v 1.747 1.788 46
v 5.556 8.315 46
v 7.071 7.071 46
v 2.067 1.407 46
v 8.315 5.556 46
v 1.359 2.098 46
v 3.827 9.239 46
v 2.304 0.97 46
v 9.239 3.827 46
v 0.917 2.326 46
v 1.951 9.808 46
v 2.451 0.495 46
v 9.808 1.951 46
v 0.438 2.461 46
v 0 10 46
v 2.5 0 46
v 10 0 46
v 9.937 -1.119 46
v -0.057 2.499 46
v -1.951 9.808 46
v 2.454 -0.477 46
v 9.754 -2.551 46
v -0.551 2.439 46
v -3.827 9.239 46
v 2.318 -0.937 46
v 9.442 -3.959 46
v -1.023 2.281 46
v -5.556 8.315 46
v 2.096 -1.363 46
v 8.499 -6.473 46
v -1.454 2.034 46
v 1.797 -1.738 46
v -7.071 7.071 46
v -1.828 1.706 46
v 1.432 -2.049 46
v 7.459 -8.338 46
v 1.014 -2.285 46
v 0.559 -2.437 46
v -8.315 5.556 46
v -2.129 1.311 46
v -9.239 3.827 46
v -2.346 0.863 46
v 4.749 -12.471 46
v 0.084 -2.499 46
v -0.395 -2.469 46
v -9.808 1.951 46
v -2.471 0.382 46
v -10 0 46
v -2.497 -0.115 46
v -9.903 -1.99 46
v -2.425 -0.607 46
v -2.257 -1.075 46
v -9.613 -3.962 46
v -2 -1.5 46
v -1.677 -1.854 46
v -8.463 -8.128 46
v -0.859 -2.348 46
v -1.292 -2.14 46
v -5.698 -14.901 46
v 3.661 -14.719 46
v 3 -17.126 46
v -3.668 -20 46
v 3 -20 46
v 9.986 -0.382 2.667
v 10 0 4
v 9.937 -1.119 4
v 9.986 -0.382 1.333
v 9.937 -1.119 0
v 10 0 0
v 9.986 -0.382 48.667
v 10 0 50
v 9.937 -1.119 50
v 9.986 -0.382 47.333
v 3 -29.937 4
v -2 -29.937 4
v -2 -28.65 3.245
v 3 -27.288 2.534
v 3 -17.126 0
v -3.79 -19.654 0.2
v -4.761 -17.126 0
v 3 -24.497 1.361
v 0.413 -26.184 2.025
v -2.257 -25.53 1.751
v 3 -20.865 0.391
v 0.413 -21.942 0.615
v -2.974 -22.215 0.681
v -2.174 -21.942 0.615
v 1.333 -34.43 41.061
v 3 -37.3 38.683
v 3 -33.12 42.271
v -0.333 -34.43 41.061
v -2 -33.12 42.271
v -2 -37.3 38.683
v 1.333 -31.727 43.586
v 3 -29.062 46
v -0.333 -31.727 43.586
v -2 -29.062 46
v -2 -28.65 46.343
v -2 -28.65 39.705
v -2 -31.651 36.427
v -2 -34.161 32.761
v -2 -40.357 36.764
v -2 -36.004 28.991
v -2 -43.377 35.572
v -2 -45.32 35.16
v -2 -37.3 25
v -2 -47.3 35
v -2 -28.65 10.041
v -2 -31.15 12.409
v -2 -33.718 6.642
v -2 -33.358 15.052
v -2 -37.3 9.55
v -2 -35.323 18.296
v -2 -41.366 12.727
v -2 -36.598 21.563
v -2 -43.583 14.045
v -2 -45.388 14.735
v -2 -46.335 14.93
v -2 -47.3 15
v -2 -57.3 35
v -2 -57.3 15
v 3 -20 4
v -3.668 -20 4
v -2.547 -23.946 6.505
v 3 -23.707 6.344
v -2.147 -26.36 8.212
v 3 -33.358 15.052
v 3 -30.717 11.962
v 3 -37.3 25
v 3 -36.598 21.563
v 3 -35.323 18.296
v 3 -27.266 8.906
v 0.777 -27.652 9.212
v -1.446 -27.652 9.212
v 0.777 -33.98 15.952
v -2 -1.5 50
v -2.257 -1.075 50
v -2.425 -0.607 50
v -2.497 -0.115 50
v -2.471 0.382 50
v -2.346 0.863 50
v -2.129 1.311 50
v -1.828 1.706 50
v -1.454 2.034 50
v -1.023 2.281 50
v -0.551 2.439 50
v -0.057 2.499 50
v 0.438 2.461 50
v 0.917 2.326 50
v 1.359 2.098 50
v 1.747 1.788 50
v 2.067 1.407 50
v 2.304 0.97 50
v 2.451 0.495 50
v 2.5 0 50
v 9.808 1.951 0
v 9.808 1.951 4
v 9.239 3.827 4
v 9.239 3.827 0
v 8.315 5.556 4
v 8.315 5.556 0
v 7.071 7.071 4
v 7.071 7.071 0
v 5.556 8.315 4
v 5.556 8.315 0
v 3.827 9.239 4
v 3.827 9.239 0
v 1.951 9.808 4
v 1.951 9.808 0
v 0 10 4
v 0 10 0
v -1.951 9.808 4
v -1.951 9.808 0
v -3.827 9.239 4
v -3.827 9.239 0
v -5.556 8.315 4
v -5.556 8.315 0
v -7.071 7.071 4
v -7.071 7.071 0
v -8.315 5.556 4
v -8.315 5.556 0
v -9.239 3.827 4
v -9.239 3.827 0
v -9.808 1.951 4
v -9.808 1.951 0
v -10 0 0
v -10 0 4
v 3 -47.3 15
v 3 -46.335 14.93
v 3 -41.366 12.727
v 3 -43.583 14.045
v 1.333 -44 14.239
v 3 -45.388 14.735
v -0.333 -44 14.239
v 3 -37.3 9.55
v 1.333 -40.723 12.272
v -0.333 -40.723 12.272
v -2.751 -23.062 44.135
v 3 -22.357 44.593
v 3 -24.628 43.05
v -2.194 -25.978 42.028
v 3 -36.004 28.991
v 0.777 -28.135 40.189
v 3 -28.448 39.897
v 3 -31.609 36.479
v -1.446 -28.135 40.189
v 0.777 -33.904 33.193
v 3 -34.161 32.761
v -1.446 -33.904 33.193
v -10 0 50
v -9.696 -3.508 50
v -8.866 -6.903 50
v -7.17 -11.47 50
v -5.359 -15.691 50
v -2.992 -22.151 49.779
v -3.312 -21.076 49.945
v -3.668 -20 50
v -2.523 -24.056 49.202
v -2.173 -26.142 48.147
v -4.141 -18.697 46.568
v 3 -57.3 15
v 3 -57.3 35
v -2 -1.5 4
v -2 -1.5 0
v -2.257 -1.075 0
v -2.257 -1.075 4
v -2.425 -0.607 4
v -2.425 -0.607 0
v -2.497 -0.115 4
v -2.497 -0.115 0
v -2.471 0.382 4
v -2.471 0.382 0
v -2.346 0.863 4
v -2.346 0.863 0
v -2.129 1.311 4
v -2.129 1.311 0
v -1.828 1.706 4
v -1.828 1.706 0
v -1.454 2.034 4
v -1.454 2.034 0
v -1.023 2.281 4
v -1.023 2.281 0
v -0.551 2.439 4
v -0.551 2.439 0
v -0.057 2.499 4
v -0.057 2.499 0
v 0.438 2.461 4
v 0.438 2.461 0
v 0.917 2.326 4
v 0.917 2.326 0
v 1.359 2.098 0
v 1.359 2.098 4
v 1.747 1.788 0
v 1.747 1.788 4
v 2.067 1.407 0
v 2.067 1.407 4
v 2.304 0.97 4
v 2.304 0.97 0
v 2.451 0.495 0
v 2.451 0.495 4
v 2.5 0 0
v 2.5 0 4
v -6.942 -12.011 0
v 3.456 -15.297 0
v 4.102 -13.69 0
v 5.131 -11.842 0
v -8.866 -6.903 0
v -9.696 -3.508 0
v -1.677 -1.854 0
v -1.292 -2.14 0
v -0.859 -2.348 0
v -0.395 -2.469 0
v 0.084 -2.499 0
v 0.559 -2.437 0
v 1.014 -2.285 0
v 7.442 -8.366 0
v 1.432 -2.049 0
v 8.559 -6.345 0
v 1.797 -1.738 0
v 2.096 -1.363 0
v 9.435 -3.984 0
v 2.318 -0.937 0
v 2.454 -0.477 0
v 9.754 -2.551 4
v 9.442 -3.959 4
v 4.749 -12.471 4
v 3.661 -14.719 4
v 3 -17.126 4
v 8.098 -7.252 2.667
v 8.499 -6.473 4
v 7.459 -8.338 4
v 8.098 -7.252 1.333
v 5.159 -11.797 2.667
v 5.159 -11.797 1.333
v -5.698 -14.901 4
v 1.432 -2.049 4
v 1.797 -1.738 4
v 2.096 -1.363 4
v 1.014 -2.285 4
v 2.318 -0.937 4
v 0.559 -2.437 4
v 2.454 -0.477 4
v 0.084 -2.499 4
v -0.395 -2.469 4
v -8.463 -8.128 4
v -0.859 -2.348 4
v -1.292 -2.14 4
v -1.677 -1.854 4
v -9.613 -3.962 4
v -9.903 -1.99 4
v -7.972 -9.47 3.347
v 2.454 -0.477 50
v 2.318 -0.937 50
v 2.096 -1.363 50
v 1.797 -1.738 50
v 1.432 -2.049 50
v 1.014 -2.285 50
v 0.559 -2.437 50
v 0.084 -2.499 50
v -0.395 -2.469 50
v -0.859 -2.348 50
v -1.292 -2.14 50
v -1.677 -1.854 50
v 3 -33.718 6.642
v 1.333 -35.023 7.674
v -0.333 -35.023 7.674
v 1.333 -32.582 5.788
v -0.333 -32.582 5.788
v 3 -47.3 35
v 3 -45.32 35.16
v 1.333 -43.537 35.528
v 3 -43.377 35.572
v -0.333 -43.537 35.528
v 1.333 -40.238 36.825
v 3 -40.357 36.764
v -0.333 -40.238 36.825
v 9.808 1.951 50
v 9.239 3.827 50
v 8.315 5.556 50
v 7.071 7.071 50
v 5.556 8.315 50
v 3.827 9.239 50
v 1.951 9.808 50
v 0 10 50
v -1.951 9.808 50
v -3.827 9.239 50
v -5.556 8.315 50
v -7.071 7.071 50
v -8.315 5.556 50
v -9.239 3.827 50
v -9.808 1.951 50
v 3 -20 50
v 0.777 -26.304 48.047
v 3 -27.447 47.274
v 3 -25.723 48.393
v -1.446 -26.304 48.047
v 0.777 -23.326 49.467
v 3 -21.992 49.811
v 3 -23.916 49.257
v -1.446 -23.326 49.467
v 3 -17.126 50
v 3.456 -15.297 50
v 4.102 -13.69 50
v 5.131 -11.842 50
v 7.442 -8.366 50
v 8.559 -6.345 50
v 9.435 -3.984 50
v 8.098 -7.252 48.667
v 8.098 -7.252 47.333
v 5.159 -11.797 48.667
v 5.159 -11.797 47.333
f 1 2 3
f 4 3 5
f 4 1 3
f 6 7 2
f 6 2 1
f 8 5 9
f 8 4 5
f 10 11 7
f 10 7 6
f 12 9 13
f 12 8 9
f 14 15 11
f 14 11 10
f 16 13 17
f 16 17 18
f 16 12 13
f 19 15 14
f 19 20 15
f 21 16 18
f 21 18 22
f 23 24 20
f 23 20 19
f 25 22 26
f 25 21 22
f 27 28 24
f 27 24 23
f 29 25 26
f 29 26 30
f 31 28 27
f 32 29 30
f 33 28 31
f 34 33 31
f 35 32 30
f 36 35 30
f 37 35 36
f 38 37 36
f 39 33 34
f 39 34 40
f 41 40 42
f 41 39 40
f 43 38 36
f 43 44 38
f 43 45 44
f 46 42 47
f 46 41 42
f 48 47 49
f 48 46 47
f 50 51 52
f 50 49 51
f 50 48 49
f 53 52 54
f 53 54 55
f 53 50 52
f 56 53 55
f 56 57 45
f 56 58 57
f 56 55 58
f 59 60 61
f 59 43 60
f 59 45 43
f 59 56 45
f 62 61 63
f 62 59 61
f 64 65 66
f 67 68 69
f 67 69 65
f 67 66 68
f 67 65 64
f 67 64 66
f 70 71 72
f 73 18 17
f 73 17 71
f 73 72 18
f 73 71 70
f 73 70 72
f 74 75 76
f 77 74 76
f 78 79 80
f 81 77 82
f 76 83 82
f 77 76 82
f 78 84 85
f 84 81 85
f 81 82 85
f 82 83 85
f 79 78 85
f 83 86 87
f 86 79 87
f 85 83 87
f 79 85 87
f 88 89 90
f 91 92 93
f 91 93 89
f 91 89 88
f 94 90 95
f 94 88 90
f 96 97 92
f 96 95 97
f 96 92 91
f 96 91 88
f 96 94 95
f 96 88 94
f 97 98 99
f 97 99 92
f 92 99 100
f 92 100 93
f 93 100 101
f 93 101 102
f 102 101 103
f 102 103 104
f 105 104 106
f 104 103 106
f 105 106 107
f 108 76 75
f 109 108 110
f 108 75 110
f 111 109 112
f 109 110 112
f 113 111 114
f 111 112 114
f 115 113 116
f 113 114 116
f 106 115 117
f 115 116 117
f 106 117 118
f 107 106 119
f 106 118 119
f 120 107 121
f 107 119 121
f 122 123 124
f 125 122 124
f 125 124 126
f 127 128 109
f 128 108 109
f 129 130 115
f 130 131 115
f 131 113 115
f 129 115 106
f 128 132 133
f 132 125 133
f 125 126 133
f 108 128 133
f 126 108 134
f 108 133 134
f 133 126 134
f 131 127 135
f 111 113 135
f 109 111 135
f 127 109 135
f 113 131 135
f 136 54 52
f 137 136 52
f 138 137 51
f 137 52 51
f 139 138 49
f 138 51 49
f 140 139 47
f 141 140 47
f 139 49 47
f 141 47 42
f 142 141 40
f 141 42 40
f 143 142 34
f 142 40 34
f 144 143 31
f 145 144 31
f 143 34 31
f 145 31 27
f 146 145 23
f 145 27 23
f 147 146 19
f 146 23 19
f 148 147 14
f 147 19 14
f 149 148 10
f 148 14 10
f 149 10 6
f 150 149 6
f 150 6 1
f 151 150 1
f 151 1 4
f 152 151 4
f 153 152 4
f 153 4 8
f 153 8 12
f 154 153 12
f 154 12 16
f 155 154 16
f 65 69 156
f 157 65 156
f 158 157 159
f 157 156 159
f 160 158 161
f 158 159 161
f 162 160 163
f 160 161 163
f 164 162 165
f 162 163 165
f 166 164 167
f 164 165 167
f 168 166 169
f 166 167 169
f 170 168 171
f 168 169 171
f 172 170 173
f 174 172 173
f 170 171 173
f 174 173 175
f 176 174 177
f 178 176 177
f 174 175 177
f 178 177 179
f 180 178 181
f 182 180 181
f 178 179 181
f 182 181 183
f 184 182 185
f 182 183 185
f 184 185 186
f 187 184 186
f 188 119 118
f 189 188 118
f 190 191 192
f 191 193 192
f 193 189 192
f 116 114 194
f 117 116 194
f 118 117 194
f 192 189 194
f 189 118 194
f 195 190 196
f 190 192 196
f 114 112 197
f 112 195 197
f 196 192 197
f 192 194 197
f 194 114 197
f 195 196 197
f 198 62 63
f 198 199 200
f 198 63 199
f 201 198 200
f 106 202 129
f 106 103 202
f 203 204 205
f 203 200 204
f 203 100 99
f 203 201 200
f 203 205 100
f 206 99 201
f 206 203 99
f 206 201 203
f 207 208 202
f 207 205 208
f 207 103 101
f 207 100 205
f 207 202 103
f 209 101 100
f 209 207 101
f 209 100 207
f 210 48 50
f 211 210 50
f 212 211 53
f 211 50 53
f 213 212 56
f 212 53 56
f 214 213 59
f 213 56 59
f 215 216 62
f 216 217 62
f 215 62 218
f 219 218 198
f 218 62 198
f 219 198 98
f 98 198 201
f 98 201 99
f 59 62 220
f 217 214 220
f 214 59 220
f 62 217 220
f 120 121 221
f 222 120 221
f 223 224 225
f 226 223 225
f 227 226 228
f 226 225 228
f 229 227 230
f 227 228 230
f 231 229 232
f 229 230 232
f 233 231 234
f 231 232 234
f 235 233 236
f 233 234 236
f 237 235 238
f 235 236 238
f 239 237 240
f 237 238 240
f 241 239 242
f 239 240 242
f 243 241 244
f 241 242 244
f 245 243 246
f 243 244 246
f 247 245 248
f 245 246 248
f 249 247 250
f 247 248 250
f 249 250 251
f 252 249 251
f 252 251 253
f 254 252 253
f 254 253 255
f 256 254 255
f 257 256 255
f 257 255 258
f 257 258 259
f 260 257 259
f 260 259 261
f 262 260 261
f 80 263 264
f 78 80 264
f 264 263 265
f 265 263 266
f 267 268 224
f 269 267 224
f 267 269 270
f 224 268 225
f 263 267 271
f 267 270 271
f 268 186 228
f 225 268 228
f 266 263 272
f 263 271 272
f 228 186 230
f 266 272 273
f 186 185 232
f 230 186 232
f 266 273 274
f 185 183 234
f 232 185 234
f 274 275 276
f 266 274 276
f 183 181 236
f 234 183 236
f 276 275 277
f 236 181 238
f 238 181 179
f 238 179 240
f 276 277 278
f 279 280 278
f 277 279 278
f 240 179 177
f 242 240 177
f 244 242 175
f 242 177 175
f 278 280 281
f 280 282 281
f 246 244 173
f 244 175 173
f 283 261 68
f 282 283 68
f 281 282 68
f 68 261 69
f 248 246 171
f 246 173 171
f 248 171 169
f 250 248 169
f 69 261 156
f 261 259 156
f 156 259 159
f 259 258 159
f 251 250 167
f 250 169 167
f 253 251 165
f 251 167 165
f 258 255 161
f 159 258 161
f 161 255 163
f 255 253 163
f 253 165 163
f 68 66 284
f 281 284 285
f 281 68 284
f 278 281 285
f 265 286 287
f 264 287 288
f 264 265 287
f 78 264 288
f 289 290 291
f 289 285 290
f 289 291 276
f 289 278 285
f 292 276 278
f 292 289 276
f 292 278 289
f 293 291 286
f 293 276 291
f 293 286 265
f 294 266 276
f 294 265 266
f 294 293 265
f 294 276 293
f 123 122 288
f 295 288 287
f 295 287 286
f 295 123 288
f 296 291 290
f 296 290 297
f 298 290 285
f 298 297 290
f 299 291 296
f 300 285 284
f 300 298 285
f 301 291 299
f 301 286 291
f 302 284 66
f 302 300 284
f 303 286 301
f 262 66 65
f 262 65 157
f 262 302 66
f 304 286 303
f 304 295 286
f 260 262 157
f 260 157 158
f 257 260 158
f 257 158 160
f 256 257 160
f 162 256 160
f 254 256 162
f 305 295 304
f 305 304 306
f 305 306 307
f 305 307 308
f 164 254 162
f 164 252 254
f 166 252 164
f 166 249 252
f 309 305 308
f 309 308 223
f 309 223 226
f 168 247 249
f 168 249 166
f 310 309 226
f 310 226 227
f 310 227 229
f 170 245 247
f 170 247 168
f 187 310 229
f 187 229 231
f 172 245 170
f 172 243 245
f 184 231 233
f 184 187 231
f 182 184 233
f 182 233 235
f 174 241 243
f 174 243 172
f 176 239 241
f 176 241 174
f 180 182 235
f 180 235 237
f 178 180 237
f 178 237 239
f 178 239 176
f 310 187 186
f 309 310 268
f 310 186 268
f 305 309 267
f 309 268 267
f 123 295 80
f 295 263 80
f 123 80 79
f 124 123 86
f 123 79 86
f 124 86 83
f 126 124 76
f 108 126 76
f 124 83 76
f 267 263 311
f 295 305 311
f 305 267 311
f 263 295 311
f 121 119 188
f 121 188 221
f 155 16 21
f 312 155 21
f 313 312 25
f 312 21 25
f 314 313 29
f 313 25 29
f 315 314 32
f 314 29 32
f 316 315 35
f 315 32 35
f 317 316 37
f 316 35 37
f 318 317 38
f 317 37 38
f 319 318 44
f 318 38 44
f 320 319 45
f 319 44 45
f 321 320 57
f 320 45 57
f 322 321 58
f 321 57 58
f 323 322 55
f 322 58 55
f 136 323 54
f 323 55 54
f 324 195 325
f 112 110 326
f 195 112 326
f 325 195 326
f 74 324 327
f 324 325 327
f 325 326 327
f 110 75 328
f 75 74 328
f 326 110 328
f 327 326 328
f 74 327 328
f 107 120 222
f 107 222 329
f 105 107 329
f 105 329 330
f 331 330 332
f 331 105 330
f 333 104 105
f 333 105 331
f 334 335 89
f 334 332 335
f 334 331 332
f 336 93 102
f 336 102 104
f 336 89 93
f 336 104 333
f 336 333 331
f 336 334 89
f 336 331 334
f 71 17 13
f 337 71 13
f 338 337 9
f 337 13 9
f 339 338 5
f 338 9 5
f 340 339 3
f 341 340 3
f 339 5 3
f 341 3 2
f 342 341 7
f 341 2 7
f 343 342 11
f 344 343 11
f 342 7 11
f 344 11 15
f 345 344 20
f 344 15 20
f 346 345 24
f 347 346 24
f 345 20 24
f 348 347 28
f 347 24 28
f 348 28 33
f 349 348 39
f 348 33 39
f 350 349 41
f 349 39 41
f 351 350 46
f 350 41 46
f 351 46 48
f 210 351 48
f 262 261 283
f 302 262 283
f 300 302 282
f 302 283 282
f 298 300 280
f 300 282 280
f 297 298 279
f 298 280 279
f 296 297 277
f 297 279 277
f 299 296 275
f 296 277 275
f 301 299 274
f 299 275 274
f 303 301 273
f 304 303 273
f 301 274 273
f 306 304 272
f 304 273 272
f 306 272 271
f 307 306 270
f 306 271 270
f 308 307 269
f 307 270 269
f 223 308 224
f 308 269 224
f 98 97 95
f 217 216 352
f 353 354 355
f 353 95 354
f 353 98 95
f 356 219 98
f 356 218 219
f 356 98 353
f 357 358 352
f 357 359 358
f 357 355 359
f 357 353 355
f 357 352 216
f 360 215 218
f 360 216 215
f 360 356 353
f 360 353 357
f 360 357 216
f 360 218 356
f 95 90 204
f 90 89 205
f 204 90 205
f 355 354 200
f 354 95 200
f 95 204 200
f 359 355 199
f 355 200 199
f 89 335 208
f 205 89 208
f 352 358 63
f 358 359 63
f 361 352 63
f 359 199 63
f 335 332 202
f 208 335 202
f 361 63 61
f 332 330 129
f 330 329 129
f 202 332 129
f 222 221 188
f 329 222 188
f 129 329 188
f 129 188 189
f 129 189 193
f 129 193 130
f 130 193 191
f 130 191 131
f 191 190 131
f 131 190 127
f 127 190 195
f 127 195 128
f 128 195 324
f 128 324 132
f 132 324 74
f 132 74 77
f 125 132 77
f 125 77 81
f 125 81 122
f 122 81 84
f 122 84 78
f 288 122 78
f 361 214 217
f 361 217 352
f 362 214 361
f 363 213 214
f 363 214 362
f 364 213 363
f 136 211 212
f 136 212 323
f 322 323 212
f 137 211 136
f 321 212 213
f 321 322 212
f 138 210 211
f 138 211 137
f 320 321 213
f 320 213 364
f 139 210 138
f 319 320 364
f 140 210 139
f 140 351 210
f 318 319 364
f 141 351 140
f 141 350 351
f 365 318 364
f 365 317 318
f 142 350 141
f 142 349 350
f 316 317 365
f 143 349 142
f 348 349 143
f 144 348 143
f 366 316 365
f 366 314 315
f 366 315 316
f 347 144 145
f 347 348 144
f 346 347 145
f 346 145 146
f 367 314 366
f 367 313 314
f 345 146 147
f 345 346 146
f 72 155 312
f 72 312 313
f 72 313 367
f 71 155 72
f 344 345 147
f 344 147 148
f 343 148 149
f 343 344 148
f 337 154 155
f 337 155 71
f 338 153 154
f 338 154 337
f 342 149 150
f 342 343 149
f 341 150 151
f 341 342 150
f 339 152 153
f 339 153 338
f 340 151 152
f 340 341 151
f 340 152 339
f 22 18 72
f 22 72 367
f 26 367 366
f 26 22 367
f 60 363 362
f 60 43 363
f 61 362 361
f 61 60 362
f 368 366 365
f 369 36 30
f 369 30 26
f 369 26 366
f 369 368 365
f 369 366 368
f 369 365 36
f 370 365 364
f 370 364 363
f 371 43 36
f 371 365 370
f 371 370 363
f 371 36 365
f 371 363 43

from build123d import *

# Parameters (mm, degrees)
ESQUISSE1_R                  = 2.5
BOSS_EXTRU_1_DEPTH           = 50
ENL_V_MAT_EXTRU_1_DEPTH      = 78.151108828
ENL_V_MAT_EXTRU_1_DEPTH_BACK = 78.151108828


with BuildPart() as part:
    # Esquisse1 → Boss.-Extru.1 (new body)
    with BuildSketch(Plane.XY):
        with BuildLine():
            ThreePointArc((10, 0), (0, 10), (-10, 0))
            add(Edge.make_bspline(
                [(-10, 0), (-10.038102543, -9.915248827), (-2.132148039, -18.010708935), (-2, -28.65)],
                knots=[0, 0, 0, 0, 1, 1, 1, 1], degree=3))
            Line((-2, -28.65), (-2, -57.3))
            Line((-2, -57.3), (3, -57.3))
            Line((3, -57.3), (3, -17.125696421))
            add(Edge.make_bspline(
                [(3, -17.125696421), (4.197007016, -10.30980911), (9.760537062, -8.681364111), (10, 0)],
                knots=[0.044553807, 0.044553807, 0.044553807, 0.044553807, 1.044553807, 1.044553807, 1.044553807, 1.044553807], degree=3))
        make_face()
        Circle(ESQUISSE1_R, mode=Mode.SUBTRACT)
    extrude(amount=BOSS_EXTRU_1_DEPTH)

    # Esquisse2 → Enlèv. mat.-Extru.1 (cut, two sides: drawn at the far end of the back side and taken through both)
    with BuildSketch(Plane(origin=(3, 0, 0), x_dir=(0, 0, -1), z_dir=(1, 0, 0)).offset(-ENL_V_MAT_EXTRU_1_DEPTH_BACK)):
        with BuildLine():
            Line((-50, -57.3), (-35, -57.3))
            Line((-35, -57.3), (-35, -47.3))
            add(Edge.make_bspline(
                [(-35, -47.3), (-35.232743916, -34.619508974), (-49.987287139, -30.383151659), (-50, -20)],
                knots=[0, 0, 0, 0, 1, 1, 1, 1], degree=3))
            Line((-50, -20), (-50, -57.3))
        make_face()
        with BuildLine():
            Line((-15, -47.3), (-15, -57.3))
            Line((-15, -57.3), (0, -57.3))
            Line((0, -57.3), (0, -17.125696421))
            add(Edge.make_bspline(
                [(0, -17.125696421), (-0.432832627, -32.702069391), (-14.978771971, -39.151873856), (-15, -47.3)],
                knots=[0.670508014, 0.670508014, 0.670508014, 0.670508014, 1.670508014, 1.670508014, 1.670508014, 1.670508014], degree=3))
        make_face()
        with BuildLine():
            add(Edge.make_bspline(
                [(-46, -20), (-40.775649876, -29.315136052), (-33.796978395, -35.093732661), (-25, -37.3)],
                knots=[0, 0, 0, 0, 1, 1, 1, 1], degree=3))
            add(Edge.make_bspline(
                [(-4, -20), (-8.708547212, -27.751388753), (-14.537623568, -36.046397597), (-25, -37.3)],
                knots=[0, 0, 0, 0, 1, 1, 1, 1], degree=3))
            Line((-4, -20), (-4, 10))
            Line((-4, 10), (-46, 10))
            Line((-46, 10), (-46, -20))
        make_face()
    extrude(amount=ENL_V_MAT_EXTRU_1_DEPTH + ENL_V_MAT_EXTRU_1_DEPTH_BACK, mode=Mode.SUBTRACT)


solid = part.part
